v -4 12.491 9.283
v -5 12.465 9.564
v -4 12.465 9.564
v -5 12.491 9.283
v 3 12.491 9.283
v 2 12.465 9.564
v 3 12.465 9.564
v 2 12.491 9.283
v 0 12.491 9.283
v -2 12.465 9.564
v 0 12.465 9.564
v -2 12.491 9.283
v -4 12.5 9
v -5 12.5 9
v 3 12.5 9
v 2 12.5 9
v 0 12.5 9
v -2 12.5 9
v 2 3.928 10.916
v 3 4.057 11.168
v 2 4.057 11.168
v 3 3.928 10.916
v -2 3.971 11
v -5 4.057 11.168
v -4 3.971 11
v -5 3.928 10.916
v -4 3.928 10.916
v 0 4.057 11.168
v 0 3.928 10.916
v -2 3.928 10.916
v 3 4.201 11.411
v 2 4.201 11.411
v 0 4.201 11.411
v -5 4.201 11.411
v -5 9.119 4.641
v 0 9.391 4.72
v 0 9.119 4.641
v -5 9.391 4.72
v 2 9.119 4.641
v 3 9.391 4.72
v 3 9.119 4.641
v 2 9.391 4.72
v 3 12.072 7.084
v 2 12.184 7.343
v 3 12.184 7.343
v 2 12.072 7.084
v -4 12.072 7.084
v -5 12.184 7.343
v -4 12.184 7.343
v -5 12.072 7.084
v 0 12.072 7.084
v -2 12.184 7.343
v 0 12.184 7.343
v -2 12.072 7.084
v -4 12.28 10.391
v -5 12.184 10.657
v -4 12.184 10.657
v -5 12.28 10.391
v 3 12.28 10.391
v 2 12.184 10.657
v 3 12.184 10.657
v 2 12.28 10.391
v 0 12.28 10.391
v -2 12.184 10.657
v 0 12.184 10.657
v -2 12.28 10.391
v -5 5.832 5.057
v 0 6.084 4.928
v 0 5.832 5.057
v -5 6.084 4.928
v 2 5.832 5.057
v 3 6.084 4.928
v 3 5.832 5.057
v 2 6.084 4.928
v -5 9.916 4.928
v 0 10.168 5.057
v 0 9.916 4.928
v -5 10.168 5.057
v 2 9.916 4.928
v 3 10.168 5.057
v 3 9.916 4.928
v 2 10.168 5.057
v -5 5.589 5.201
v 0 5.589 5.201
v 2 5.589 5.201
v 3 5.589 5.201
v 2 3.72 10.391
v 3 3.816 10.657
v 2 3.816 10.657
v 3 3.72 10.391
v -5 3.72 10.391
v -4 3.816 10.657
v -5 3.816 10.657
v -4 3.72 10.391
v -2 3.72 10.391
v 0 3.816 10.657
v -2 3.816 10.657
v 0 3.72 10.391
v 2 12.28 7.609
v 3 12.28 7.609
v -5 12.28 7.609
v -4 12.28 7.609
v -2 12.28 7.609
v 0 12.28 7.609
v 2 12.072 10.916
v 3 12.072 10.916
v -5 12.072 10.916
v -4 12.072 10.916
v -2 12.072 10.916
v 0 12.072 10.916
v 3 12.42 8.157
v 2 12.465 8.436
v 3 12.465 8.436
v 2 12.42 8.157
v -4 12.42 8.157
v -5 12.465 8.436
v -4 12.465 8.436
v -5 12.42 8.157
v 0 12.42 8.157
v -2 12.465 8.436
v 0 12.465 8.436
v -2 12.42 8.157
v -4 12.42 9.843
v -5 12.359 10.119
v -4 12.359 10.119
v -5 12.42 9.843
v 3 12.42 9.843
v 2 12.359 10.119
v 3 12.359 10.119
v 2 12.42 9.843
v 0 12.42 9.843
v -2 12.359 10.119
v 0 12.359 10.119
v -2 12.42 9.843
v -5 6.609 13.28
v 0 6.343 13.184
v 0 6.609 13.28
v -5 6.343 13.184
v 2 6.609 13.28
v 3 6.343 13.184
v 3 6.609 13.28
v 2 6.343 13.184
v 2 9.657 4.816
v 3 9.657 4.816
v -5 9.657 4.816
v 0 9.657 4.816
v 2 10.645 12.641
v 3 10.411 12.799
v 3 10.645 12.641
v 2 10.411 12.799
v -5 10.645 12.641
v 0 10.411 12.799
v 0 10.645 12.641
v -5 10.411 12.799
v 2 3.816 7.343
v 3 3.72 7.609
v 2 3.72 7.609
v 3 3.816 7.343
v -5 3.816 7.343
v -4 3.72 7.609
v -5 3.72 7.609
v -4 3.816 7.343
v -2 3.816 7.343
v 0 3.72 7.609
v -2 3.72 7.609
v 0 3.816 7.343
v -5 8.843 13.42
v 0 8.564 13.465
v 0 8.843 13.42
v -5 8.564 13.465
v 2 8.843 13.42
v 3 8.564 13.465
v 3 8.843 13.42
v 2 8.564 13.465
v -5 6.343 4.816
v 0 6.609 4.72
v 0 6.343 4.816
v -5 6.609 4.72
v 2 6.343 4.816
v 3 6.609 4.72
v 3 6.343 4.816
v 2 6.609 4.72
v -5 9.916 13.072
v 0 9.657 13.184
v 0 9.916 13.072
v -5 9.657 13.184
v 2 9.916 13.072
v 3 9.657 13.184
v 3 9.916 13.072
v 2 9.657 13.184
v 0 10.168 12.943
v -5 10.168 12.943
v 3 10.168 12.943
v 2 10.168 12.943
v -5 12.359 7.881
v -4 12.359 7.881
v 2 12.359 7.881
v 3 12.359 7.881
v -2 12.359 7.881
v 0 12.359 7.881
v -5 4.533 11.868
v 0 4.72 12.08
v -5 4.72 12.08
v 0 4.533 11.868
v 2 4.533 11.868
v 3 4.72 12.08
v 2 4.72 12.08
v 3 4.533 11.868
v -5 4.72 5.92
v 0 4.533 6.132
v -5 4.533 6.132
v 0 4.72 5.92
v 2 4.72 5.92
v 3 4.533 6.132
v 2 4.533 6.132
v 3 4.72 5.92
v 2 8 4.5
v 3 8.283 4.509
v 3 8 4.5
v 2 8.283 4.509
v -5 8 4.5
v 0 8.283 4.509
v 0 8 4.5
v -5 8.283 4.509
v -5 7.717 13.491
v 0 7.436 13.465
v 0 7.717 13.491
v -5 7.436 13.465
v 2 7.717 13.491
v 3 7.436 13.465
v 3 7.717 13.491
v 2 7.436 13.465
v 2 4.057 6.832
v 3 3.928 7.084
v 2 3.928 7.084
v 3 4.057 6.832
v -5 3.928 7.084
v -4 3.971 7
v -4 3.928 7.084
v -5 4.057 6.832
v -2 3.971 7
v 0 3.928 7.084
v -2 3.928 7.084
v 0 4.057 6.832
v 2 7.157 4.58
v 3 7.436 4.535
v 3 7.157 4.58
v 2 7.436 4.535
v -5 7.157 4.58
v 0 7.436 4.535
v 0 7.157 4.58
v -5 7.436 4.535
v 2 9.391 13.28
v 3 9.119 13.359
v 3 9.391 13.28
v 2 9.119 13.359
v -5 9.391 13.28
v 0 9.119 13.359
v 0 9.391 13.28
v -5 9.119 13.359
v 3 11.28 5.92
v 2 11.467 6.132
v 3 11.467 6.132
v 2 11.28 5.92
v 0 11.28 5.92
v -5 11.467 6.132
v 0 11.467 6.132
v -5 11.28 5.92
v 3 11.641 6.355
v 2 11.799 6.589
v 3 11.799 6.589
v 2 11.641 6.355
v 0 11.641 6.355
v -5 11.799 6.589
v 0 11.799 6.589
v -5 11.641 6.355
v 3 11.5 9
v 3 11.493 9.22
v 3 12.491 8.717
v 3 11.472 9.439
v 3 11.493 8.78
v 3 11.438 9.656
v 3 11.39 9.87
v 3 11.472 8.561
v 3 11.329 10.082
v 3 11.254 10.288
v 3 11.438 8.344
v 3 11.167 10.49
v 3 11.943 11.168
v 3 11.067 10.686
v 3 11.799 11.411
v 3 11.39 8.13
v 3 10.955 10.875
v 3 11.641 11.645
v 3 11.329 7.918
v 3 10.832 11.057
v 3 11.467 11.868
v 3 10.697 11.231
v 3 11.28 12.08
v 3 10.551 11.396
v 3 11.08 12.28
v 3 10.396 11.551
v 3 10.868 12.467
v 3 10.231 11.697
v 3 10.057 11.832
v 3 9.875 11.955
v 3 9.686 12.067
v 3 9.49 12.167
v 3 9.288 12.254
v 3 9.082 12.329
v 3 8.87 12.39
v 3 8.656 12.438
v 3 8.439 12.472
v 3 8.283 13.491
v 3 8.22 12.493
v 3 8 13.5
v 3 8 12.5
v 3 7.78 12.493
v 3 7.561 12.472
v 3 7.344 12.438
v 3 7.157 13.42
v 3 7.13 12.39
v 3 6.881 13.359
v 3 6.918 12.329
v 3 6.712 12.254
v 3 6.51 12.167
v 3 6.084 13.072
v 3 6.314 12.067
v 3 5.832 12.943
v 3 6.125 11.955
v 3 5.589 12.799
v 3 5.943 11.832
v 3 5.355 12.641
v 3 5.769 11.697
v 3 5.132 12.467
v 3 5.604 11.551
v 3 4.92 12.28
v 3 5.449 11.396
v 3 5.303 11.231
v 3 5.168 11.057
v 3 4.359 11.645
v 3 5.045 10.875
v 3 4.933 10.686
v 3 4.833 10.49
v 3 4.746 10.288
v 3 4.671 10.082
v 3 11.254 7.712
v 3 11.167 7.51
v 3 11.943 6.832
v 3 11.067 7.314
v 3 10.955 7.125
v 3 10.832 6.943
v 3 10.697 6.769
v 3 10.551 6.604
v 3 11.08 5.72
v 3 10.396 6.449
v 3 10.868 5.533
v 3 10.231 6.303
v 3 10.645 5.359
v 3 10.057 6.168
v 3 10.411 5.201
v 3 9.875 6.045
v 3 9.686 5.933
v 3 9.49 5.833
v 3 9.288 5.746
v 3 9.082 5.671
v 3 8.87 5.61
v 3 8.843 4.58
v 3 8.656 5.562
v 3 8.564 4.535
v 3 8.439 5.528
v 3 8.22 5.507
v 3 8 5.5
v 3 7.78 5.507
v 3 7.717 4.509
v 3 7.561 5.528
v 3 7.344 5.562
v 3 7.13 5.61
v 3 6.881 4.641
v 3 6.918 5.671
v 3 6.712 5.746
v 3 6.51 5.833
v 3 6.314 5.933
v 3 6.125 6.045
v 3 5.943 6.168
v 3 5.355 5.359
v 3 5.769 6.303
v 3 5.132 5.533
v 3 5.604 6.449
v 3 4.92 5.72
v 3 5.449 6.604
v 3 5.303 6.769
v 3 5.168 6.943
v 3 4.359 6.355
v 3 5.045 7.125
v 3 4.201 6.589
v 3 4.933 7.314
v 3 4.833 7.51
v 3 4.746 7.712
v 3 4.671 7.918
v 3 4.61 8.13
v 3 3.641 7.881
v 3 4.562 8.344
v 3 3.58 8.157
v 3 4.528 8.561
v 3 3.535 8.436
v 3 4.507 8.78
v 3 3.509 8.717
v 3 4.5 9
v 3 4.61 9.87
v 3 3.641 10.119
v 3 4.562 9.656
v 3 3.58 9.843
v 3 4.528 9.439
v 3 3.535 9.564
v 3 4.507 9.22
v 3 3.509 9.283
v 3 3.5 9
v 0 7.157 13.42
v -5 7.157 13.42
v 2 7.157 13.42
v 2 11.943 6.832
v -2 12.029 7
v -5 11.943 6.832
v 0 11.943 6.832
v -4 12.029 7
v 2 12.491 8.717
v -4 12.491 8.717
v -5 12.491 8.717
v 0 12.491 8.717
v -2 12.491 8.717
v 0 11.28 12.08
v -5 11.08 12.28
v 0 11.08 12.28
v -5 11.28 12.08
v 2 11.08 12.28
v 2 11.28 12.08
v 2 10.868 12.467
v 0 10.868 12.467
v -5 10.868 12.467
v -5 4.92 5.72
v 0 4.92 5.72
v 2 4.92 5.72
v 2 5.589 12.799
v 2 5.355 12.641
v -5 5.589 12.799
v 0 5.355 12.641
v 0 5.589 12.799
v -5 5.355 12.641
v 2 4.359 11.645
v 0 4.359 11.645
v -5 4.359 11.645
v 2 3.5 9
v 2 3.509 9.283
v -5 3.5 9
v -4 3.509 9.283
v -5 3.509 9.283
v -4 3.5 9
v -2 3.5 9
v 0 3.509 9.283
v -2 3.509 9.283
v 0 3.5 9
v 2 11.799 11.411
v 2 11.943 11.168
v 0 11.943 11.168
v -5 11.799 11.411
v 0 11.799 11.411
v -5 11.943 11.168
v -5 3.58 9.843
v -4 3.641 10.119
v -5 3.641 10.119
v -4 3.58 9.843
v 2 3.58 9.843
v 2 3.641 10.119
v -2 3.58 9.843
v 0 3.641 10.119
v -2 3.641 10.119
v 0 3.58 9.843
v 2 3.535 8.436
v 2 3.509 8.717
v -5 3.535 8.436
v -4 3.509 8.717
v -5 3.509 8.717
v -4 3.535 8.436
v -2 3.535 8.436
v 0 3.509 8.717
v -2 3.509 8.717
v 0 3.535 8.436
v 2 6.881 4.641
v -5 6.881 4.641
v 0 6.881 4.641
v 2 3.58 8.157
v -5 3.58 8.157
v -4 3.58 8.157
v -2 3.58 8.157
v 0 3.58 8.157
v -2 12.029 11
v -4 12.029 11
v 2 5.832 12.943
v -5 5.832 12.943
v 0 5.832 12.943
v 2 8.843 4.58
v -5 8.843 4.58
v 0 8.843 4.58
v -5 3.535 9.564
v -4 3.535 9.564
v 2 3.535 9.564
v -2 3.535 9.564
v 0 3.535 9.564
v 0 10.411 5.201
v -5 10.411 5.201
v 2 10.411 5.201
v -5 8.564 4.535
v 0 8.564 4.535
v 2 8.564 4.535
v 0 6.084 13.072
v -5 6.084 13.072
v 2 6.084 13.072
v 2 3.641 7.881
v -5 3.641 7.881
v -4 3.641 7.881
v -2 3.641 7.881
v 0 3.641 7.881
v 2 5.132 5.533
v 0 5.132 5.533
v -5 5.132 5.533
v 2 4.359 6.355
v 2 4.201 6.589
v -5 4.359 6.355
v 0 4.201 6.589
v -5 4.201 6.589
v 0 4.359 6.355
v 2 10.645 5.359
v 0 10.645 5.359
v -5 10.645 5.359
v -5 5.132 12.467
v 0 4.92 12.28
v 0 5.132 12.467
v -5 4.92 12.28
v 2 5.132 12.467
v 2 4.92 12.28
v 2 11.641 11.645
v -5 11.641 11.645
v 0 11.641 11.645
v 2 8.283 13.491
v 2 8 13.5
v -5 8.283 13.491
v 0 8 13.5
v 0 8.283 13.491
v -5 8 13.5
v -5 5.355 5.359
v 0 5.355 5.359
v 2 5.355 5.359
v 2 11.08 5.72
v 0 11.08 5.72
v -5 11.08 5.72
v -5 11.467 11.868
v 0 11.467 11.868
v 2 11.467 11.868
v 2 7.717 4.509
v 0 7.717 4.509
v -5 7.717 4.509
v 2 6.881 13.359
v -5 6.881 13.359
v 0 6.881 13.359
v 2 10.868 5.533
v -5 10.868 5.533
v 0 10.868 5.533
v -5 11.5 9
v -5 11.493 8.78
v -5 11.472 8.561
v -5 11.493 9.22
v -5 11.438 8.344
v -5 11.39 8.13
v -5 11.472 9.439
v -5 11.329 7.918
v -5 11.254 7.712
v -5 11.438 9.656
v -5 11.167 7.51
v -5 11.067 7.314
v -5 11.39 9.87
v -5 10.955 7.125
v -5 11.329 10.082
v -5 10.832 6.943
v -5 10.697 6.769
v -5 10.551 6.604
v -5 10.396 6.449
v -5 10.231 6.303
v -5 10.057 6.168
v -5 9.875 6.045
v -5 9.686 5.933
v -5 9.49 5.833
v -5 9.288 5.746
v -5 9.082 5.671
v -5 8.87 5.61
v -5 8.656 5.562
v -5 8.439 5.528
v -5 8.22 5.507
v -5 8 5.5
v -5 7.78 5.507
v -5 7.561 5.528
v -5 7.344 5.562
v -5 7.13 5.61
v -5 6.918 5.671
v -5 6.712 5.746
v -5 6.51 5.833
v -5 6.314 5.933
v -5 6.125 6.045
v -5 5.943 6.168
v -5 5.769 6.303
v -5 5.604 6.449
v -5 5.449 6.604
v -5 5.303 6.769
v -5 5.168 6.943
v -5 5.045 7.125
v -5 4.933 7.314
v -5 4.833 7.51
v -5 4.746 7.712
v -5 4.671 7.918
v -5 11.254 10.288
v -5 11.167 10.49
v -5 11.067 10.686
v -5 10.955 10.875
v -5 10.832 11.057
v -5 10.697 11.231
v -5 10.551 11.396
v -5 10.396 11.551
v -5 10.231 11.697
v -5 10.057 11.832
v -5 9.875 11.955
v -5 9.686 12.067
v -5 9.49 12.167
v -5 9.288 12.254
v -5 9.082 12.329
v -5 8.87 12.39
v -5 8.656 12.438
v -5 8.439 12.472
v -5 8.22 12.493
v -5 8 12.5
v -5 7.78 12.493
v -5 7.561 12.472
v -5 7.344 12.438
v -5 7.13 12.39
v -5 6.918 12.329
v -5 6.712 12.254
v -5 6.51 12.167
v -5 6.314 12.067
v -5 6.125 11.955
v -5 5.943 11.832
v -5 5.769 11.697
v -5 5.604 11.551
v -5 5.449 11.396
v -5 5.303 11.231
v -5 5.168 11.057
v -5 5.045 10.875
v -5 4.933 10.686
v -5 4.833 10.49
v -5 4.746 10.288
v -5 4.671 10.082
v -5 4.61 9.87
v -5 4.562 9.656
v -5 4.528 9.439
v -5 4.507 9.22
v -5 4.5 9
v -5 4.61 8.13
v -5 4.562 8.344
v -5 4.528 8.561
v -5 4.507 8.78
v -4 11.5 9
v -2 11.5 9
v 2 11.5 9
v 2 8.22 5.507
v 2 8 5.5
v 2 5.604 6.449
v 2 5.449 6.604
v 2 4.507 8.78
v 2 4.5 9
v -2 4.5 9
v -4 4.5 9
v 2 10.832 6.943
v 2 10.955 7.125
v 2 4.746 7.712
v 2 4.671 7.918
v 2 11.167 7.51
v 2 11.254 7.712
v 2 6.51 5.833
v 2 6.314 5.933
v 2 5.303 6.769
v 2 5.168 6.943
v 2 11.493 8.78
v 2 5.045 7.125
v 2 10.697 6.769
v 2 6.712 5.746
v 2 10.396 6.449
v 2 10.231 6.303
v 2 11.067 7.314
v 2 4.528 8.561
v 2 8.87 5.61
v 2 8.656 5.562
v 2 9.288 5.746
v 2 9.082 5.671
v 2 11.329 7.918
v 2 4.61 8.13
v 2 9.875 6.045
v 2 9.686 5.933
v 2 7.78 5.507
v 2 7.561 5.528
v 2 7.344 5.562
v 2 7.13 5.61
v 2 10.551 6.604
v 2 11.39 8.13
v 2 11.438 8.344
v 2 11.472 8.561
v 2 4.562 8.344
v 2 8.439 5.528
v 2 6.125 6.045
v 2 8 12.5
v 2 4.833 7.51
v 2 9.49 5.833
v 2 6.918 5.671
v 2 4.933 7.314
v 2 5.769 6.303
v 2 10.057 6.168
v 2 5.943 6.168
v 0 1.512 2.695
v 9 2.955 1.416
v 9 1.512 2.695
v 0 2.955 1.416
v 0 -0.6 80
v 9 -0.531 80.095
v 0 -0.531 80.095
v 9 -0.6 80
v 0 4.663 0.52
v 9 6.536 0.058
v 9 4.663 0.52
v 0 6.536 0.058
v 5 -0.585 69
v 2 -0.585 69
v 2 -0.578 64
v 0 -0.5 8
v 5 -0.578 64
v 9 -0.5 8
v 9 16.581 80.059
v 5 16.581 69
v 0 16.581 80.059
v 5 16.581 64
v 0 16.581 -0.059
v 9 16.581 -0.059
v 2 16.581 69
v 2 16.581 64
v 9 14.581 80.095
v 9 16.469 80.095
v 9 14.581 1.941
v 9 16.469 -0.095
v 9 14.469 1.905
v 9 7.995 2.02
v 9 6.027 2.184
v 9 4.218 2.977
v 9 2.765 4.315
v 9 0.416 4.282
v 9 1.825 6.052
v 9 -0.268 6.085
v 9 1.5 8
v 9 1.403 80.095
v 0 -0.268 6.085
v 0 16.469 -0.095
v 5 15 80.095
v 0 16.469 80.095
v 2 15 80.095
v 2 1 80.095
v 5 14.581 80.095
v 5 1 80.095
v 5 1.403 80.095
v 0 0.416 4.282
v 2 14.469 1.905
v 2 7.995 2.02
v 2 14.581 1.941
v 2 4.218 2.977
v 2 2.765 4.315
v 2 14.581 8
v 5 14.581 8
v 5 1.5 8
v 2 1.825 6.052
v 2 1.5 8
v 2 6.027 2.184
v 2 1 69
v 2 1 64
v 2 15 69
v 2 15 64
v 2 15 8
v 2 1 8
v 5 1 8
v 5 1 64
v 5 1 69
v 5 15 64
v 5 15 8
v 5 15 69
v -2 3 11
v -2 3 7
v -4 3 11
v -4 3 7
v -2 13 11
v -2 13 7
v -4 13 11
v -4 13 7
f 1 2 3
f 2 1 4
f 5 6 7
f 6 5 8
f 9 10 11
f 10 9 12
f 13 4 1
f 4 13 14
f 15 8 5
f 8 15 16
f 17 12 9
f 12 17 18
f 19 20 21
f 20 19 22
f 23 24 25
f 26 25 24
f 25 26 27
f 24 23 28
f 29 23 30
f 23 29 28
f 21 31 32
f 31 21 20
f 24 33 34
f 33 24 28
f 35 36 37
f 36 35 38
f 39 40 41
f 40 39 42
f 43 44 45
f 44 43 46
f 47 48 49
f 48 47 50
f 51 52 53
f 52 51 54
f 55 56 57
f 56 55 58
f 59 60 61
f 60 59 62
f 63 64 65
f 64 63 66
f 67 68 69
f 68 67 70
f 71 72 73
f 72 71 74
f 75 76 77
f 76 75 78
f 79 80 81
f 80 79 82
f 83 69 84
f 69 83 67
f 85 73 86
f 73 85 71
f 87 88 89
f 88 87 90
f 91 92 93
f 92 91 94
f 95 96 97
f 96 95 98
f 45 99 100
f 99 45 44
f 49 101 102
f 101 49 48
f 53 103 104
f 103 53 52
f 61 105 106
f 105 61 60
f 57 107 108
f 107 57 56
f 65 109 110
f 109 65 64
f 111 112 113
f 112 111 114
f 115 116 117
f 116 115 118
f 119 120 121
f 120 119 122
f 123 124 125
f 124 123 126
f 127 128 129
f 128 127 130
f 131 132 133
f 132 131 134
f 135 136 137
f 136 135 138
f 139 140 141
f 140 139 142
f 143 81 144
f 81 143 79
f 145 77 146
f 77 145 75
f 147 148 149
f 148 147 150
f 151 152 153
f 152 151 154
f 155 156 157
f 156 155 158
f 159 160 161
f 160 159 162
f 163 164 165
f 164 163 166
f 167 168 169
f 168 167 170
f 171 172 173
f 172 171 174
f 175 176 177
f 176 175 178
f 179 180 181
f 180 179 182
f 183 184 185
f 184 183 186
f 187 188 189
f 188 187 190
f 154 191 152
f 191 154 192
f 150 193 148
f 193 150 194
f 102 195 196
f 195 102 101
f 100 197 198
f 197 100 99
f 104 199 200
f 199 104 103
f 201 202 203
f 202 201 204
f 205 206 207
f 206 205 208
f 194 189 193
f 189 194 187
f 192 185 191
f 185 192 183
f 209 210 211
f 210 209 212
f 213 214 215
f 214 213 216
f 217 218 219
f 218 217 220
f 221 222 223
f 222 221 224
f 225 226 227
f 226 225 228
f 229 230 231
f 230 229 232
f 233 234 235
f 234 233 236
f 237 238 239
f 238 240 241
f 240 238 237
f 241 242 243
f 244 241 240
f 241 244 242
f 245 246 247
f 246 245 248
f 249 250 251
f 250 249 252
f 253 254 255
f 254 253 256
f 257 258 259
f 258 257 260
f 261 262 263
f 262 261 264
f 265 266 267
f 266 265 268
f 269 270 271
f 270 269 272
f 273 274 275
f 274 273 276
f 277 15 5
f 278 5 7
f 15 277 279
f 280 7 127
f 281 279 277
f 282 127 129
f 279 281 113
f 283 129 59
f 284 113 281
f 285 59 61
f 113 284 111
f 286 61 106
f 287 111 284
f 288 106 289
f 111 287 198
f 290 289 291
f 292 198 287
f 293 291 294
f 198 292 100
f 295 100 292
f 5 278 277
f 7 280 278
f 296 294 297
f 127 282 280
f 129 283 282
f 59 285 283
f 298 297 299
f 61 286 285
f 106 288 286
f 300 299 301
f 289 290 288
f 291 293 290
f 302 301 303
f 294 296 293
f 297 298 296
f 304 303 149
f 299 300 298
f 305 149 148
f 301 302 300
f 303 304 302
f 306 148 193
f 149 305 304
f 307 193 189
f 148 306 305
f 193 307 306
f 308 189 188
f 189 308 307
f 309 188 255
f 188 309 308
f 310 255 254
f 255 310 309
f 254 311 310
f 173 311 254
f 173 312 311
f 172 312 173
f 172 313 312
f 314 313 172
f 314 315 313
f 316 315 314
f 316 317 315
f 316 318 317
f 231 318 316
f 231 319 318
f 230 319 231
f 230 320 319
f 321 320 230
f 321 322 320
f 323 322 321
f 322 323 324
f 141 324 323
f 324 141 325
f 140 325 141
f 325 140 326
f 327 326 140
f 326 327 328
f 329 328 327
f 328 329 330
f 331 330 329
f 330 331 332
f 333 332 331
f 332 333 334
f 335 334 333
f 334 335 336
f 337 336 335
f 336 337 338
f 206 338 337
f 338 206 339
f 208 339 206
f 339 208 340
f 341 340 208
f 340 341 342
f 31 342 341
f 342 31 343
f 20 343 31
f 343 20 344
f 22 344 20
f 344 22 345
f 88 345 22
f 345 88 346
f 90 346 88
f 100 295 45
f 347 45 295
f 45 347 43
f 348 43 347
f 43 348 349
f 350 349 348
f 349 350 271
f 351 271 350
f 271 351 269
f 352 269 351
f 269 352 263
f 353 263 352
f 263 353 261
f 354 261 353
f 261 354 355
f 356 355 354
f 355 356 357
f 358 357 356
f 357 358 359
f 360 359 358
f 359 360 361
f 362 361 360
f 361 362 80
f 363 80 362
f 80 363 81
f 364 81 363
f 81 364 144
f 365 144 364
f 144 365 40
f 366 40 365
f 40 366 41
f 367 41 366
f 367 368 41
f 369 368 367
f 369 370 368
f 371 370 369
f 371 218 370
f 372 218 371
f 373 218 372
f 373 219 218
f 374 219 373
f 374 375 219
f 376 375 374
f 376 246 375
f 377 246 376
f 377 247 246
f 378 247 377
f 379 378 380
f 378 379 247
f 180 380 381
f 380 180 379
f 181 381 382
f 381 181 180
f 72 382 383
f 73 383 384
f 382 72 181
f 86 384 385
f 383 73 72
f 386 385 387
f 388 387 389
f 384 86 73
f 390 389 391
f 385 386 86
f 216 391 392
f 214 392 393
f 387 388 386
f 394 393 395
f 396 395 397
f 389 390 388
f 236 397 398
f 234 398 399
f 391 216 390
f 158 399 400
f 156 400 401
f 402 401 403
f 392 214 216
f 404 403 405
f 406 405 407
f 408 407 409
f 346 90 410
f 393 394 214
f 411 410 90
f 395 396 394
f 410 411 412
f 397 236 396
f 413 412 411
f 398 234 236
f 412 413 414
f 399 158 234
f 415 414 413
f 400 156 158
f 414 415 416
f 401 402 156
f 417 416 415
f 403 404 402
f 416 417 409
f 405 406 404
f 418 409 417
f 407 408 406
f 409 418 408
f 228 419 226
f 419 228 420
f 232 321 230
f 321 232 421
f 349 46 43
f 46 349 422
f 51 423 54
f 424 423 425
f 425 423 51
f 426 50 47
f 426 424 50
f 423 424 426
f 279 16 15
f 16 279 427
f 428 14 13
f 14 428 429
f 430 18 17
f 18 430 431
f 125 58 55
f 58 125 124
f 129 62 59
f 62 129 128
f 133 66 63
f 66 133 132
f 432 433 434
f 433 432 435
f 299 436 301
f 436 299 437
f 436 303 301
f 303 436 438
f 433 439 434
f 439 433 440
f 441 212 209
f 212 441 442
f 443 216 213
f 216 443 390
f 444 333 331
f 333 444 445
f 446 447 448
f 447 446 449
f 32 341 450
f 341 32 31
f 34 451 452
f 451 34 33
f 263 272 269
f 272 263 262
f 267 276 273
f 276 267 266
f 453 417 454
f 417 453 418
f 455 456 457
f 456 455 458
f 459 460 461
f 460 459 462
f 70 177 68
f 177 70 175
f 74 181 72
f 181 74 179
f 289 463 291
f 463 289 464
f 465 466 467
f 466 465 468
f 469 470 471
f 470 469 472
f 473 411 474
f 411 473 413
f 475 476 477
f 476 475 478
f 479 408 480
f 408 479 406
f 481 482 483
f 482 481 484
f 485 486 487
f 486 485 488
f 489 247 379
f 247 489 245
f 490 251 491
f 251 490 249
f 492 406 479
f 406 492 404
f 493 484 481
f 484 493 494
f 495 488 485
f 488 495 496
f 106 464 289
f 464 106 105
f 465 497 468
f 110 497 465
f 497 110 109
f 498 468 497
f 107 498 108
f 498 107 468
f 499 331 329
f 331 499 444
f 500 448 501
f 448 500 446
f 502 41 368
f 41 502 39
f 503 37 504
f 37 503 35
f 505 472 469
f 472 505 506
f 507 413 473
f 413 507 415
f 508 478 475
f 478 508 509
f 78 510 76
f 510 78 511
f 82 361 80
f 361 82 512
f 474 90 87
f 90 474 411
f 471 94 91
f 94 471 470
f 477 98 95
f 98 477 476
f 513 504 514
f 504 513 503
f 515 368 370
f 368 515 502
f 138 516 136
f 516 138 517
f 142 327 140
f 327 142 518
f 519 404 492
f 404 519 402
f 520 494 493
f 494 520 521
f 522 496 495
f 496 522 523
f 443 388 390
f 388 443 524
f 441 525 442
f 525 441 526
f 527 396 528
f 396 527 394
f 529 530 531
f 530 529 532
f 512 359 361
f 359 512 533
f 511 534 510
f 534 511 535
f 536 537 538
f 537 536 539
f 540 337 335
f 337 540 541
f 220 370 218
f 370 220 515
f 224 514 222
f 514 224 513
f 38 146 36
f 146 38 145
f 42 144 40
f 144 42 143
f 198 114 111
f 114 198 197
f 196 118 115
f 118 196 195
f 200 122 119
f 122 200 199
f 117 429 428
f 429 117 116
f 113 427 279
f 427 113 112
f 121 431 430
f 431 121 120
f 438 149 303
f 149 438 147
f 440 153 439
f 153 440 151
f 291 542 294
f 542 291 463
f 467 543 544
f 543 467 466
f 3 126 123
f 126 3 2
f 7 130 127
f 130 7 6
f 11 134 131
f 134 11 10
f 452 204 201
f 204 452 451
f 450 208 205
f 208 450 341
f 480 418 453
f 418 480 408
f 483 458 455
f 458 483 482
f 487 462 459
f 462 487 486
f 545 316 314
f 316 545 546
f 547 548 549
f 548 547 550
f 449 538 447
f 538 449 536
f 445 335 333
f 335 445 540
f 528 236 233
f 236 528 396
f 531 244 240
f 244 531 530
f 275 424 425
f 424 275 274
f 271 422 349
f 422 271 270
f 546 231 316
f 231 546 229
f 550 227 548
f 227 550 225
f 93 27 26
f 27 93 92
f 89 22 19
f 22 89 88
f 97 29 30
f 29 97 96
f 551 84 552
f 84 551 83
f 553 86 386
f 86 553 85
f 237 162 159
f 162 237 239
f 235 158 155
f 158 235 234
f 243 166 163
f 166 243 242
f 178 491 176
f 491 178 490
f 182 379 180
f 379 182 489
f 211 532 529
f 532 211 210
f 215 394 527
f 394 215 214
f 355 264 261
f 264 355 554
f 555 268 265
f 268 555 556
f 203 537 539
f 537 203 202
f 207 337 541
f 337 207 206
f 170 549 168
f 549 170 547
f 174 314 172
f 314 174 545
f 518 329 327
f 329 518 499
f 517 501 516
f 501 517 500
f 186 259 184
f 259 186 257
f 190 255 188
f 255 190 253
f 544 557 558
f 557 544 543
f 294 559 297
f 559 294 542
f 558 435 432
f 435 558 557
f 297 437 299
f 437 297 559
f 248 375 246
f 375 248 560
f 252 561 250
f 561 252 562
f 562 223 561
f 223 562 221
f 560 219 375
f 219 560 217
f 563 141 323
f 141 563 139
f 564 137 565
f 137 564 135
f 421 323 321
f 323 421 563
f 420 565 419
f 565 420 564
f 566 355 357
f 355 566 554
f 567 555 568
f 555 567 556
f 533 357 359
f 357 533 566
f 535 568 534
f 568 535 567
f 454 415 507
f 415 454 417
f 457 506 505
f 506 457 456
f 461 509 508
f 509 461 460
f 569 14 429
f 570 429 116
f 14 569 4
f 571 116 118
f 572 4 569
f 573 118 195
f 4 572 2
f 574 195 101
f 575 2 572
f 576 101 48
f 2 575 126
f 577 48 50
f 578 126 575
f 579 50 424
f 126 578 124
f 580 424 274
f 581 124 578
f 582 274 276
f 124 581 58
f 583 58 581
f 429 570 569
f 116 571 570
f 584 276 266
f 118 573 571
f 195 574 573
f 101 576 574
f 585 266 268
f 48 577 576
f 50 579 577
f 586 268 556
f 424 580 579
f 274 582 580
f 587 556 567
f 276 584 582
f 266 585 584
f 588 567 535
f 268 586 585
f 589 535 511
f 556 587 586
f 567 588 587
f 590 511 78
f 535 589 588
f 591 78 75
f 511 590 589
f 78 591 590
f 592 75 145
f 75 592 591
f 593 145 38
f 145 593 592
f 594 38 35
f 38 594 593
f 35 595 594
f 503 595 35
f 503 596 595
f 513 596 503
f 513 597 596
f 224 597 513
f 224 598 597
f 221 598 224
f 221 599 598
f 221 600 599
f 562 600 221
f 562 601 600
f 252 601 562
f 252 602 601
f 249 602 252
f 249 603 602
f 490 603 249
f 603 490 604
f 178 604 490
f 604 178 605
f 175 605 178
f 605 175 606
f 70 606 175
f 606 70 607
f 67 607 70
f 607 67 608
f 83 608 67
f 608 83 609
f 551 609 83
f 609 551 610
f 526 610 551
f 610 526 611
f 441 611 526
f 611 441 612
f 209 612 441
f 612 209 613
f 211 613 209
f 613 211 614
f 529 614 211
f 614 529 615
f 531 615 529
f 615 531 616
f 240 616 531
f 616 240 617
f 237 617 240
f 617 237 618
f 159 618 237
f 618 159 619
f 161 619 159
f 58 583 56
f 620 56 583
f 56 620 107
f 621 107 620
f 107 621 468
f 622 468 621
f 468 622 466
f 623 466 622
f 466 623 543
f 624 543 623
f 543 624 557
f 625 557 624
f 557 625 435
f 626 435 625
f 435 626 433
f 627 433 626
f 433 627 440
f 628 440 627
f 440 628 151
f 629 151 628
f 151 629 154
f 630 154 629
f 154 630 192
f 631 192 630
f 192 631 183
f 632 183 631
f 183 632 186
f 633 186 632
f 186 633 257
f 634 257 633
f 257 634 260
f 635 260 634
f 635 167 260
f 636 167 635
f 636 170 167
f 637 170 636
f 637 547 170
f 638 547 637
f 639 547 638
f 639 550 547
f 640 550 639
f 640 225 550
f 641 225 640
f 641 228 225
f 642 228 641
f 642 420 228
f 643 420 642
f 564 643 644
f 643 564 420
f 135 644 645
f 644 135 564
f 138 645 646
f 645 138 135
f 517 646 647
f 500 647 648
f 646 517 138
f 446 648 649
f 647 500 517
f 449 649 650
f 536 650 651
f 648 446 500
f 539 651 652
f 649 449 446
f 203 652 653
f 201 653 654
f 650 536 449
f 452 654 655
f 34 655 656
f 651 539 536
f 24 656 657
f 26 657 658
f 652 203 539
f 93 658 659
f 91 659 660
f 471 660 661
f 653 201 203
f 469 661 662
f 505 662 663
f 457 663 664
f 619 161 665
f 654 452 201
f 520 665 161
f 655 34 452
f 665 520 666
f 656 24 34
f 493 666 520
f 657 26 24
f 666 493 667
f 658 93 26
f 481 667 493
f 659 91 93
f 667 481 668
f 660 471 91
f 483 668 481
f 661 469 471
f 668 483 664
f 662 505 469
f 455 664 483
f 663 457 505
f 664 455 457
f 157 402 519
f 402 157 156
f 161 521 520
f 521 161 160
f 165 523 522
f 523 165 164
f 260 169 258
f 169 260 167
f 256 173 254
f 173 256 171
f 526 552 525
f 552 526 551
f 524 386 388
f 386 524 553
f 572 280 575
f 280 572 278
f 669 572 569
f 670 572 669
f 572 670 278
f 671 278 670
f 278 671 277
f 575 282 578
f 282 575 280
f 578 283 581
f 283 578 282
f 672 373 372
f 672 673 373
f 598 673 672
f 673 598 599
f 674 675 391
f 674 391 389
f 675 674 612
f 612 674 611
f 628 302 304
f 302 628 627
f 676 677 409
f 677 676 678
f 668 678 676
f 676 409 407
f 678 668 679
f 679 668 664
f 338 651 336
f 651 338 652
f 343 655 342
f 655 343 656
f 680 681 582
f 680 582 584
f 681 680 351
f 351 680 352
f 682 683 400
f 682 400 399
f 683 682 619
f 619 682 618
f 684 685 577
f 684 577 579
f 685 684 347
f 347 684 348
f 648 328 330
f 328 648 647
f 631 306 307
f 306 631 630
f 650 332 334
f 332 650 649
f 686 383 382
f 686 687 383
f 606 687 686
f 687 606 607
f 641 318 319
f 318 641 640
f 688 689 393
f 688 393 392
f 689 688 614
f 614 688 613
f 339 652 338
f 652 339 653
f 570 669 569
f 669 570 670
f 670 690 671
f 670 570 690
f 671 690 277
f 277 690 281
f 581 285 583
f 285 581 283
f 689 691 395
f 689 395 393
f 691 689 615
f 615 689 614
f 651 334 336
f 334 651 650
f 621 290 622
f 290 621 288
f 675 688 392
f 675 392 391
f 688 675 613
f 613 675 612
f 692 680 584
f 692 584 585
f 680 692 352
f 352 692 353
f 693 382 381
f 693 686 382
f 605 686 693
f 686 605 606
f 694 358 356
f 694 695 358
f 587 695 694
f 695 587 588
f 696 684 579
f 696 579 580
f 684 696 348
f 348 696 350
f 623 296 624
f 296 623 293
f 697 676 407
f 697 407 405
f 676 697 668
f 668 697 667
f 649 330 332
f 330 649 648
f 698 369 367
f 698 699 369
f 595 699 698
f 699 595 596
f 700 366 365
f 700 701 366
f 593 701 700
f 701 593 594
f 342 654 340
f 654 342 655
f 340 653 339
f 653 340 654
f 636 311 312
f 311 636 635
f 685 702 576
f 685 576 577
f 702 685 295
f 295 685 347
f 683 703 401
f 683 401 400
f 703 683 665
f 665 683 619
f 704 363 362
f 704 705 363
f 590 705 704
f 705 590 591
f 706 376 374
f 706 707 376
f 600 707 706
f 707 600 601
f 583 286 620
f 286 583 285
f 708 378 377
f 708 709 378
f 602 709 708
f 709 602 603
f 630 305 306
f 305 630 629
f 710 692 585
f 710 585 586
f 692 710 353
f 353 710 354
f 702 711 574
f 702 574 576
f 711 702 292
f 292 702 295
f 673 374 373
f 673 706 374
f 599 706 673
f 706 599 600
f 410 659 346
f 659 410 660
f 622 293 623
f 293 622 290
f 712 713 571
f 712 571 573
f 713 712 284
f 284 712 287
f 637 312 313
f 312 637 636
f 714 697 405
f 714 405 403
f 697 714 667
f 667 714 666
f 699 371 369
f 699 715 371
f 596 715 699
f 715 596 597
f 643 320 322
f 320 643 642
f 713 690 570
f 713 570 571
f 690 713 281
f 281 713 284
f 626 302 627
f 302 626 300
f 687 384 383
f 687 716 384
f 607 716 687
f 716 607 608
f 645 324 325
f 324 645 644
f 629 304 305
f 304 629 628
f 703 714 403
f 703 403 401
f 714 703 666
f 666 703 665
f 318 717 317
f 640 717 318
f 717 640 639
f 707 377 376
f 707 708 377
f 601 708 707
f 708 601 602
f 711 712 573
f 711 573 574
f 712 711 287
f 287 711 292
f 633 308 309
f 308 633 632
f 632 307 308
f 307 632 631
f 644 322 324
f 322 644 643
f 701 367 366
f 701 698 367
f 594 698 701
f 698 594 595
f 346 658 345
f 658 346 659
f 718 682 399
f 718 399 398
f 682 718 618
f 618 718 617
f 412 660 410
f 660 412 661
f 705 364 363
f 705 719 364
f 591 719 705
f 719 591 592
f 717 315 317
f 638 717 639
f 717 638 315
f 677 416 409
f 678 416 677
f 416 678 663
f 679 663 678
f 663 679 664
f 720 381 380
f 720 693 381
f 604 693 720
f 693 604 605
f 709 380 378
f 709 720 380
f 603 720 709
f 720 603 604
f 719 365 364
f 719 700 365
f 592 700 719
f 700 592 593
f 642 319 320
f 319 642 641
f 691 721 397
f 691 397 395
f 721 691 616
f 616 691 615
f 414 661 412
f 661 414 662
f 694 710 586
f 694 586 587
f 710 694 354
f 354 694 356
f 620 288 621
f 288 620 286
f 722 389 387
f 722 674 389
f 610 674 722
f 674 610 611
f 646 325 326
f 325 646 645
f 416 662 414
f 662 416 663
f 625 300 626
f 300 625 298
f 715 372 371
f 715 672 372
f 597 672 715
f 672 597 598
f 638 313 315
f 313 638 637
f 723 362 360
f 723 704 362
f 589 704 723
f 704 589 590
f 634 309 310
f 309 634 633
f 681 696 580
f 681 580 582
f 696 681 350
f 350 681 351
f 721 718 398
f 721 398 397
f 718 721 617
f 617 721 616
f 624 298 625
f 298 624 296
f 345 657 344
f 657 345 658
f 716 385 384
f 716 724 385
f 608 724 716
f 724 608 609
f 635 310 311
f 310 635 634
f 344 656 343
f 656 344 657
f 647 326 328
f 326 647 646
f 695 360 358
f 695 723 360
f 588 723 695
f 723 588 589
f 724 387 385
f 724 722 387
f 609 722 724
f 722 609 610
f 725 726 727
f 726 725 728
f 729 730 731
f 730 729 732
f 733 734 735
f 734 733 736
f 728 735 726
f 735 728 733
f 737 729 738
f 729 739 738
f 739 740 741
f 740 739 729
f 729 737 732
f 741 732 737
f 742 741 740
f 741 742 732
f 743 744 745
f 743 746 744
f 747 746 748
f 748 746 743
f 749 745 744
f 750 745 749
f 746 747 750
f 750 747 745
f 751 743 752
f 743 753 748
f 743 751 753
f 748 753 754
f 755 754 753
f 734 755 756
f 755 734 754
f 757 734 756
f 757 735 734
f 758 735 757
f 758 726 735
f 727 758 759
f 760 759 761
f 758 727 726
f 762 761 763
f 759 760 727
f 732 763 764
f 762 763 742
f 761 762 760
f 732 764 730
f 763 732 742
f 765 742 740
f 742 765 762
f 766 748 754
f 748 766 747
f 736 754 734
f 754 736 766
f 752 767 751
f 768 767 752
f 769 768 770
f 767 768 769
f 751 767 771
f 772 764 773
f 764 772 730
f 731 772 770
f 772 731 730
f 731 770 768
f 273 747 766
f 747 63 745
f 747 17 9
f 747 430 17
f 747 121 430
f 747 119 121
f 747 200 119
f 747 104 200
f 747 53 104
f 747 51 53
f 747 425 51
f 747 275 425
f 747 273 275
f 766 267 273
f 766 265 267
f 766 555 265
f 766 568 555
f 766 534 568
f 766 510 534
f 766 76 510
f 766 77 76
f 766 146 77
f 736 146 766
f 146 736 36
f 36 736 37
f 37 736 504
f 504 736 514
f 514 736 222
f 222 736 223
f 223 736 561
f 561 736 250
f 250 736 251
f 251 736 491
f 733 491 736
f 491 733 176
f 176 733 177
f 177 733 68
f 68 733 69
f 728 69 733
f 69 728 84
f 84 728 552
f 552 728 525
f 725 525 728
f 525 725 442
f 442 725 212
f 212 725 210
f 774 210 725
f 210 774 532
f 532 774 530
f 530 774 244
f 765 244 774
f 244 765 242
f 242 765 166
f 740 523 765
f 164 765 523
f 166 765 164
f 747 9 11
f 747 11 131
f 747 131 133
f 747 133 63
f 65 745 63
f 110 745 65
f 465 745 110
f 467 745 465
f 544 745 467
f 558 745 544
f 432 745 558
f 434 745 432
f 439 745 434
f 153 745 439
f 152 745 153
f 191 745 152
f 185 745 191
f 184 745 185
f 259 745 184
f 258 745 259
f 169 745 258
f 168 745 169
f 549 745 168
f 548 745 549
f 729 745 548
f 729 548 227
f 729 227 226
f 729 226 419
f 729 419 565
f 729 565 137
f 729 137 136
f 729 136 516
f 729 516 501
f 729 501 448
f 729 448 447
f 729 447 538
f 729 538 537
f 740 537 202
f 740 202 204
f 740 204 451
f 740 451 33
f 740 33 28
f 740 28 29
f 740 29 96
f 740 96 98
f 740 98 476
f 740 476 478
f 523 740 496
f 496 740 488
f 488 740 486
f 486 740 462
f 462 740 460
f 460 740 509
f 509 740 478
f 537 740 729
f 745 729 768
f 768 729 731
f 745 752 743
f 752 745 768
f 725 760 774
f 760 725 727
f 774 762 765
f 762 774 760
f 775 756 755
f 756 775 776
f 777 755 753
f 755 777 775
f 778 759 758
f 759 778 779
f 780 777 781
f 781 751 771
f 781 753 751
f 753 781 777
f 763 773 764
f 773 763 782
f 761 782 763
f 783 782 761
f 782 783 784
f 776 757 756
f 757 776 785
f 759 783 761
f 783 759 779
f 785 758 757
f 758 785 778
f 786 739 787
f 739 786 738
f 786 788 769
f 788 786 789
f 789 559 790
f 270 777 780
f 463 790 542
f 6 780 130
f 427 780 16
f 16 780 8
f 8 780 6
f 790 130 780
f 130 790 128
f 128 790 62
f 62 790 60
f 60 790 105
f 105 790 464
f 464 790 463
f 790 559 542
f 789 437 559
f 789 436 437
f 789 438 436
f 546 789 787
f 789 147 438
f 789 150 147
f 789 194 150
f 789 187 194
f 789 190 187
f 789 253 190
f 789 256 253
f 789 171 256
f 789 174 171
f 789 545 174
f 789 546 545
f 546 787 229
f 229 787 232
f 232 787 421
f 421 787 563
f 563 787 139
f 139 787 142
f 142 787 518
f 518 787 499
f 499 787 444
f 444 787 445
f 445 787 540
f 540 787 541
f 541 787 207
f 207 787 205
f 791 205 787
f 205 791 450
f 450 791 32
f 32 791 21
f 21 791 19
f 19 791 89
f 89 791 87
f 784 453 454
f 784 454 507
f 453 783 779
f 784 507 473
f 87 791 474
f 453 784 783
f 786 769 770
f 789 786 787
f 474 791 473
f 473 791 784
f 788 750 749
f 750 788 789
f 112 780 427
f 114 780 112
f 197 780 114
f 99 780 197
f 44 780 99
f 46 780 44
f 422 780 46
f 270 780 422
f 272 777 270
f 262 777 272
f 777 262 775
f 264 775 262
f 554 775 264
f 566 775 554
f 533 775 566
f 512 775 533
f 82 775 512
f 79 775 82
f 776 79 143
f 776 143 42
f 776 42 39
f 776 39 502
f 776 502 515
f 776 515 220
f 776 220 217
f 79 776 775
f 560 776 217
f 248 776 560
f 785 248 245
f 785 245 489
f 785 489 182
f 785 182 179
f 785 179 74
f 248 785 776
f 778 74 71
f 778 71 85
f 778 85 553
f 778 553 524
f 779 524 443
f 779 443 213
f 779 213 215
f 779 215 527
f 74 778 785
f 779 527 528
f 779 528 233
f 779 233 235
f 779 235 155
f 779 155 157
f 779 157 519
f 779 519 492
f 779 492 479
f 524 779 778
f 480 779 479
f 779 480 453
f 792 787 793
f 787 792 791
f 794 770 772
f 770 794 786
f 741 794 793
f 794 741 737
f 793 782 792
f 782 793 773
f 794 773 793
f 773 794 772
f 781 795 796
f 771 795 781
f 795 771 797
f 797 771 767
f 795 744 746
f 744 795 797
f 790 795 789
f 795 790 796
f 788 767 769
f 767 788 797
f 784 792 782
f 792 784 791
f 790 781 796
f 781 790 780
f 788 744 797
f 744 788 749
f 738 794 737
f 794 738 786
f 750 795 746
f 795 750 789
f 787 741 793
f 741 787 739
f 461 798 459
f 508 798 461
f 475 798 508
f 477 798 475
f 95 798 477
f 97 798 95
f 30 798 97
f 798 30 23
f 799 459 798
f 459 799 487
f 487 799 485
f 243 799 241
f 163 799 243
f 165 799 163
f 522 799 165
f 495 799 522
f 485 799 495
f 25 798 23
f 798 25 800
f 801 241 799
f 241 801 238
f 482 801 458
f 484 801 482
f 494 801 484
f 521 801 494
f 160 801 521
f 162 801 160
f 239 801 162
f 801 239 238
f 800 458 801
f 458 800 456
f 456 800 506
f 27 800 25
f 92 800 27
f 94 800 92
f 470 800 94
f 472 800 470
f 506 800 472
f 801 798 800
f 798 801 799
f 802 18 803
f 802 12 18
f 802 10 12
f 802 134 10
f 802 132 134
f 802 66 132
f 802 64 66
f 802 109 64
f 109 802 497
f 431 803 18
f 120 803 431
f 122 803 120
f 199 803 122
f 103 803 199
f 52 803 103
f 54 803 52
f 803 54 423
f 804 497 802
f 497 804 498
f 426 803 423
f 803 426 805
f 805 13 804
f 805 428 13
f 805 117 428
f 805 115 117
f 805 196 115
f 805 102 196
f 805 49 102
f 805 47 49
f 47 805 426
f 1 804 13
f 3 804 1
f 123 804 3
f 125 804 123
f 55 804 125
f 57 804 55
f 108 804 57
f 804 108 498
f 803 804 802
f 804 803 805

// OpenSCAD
/*
Oilon Junior Pro LDR case
Vaasa Hacklab ry 22.8.2014
*/

module roundedRect(size, radius)
{
x = size[0];
y = size[1];
z = size[2];

linear_extrude(height=z)
hull()
{
// place 4 circles in the corners, with the given radius
translate([(-x/2), (-y/2), 0])
circle(r=0.1);

translate([(x/2)-(radius), (-y/2)+(radius), 0])
circle(r=radius);

translate([(-x/2), (y/2), 0])
circle(r=0.1);

translate([(x/2), (y/2), 0])
circle(r=0.1);
}
}



union() {
	translate([-5,8,9])
	rotate([90,0,90])
		difference() {
			cylinder(h = 8, r=4.5, $fn = 100);
			cylinder(h = 8, r=3.5, $fn = 100);

		}

	// klipsi1

	translate([-4,3,7])
#		cube([2,1.5,4]);

	translate([-4,11.5,7])
#		cube([2,1.5,4]);

//	translate([-4,3,7])
//		union() {
//			intersection() {
//				cube(size = [4, 1, 3]);
//				translate([0,1.6,1.5])
//					rotate([90,0,90])
//						cylinder(h = 4, r=2, $fn = 100);
//			}
//			intersection() {
//				translate([-2,0.5,1.5])
//					rotate([90,0,90])
//						cylinder(h = 2, r=1.8, $fn = 100);
//				rotate([270,0,180])
//				translate([0,-3,-1])
//	#				prism(3, 2, 2);
//			}
//	}

	// klipsi2
//	translate([-4,12,7])
//		union() {
//			intersection() {
//				cube(size = [4, 1, 3]);
//				translate([0,-0.6,1.5])
//					rotate([90,0,90])
//						cylinder(h = 4, r=2, $fn = 100);
//			}
//			intersection() {
//				translate([-2,0.5,1.5])
//					rotate([90,0,90])
//						cylinder(h = 2, r=1.8, $fn = 100);
//				rotate([90,0,180])
//					prism(3, 2, 2);
//			}
//		}

	// kotelon runko
//	rotate([0,0,90])
//	translate([0,-9,0])

	rotate([90,0,270])
	translate([-8,40,-9]) {

		difference() {	
			roundedRect([17,80,9],8);

//			cube(size = [16, 9, 50]);
			translate([0,2,0])
				roundedRect([13,80,7],6);
//				cube(size = [14, 7, 50]);
			translate([-7,-32,4])
#				cube(size = [14, 80, 3]);


			translate([0,-31,5])
				rotate([0,0,0])
#					cylinder(h = 5, r=3.5, $fn = 100);
			translate([-10,24,4])
#			cube(size=[20,5,3]);
		}
	}
}


/*
 https://github.com/dannystaple/OpenSCAD-Parts-Library/blob/master/prism.scad
*/
//Draw a prism based on a 
//right angled triangle
//l - length of prism
//w - width of triangle
//h - height of triangle
module prism(l, w, h) {
	translate([0, l, 0]) rotate( a= [90, 0, 0]) 
	linear_extrude(height = l) polygon(points = [
		[0, 0],
		[w, 0],
		[0, h]
	], paths=[[0,1,2,0]]);
}
